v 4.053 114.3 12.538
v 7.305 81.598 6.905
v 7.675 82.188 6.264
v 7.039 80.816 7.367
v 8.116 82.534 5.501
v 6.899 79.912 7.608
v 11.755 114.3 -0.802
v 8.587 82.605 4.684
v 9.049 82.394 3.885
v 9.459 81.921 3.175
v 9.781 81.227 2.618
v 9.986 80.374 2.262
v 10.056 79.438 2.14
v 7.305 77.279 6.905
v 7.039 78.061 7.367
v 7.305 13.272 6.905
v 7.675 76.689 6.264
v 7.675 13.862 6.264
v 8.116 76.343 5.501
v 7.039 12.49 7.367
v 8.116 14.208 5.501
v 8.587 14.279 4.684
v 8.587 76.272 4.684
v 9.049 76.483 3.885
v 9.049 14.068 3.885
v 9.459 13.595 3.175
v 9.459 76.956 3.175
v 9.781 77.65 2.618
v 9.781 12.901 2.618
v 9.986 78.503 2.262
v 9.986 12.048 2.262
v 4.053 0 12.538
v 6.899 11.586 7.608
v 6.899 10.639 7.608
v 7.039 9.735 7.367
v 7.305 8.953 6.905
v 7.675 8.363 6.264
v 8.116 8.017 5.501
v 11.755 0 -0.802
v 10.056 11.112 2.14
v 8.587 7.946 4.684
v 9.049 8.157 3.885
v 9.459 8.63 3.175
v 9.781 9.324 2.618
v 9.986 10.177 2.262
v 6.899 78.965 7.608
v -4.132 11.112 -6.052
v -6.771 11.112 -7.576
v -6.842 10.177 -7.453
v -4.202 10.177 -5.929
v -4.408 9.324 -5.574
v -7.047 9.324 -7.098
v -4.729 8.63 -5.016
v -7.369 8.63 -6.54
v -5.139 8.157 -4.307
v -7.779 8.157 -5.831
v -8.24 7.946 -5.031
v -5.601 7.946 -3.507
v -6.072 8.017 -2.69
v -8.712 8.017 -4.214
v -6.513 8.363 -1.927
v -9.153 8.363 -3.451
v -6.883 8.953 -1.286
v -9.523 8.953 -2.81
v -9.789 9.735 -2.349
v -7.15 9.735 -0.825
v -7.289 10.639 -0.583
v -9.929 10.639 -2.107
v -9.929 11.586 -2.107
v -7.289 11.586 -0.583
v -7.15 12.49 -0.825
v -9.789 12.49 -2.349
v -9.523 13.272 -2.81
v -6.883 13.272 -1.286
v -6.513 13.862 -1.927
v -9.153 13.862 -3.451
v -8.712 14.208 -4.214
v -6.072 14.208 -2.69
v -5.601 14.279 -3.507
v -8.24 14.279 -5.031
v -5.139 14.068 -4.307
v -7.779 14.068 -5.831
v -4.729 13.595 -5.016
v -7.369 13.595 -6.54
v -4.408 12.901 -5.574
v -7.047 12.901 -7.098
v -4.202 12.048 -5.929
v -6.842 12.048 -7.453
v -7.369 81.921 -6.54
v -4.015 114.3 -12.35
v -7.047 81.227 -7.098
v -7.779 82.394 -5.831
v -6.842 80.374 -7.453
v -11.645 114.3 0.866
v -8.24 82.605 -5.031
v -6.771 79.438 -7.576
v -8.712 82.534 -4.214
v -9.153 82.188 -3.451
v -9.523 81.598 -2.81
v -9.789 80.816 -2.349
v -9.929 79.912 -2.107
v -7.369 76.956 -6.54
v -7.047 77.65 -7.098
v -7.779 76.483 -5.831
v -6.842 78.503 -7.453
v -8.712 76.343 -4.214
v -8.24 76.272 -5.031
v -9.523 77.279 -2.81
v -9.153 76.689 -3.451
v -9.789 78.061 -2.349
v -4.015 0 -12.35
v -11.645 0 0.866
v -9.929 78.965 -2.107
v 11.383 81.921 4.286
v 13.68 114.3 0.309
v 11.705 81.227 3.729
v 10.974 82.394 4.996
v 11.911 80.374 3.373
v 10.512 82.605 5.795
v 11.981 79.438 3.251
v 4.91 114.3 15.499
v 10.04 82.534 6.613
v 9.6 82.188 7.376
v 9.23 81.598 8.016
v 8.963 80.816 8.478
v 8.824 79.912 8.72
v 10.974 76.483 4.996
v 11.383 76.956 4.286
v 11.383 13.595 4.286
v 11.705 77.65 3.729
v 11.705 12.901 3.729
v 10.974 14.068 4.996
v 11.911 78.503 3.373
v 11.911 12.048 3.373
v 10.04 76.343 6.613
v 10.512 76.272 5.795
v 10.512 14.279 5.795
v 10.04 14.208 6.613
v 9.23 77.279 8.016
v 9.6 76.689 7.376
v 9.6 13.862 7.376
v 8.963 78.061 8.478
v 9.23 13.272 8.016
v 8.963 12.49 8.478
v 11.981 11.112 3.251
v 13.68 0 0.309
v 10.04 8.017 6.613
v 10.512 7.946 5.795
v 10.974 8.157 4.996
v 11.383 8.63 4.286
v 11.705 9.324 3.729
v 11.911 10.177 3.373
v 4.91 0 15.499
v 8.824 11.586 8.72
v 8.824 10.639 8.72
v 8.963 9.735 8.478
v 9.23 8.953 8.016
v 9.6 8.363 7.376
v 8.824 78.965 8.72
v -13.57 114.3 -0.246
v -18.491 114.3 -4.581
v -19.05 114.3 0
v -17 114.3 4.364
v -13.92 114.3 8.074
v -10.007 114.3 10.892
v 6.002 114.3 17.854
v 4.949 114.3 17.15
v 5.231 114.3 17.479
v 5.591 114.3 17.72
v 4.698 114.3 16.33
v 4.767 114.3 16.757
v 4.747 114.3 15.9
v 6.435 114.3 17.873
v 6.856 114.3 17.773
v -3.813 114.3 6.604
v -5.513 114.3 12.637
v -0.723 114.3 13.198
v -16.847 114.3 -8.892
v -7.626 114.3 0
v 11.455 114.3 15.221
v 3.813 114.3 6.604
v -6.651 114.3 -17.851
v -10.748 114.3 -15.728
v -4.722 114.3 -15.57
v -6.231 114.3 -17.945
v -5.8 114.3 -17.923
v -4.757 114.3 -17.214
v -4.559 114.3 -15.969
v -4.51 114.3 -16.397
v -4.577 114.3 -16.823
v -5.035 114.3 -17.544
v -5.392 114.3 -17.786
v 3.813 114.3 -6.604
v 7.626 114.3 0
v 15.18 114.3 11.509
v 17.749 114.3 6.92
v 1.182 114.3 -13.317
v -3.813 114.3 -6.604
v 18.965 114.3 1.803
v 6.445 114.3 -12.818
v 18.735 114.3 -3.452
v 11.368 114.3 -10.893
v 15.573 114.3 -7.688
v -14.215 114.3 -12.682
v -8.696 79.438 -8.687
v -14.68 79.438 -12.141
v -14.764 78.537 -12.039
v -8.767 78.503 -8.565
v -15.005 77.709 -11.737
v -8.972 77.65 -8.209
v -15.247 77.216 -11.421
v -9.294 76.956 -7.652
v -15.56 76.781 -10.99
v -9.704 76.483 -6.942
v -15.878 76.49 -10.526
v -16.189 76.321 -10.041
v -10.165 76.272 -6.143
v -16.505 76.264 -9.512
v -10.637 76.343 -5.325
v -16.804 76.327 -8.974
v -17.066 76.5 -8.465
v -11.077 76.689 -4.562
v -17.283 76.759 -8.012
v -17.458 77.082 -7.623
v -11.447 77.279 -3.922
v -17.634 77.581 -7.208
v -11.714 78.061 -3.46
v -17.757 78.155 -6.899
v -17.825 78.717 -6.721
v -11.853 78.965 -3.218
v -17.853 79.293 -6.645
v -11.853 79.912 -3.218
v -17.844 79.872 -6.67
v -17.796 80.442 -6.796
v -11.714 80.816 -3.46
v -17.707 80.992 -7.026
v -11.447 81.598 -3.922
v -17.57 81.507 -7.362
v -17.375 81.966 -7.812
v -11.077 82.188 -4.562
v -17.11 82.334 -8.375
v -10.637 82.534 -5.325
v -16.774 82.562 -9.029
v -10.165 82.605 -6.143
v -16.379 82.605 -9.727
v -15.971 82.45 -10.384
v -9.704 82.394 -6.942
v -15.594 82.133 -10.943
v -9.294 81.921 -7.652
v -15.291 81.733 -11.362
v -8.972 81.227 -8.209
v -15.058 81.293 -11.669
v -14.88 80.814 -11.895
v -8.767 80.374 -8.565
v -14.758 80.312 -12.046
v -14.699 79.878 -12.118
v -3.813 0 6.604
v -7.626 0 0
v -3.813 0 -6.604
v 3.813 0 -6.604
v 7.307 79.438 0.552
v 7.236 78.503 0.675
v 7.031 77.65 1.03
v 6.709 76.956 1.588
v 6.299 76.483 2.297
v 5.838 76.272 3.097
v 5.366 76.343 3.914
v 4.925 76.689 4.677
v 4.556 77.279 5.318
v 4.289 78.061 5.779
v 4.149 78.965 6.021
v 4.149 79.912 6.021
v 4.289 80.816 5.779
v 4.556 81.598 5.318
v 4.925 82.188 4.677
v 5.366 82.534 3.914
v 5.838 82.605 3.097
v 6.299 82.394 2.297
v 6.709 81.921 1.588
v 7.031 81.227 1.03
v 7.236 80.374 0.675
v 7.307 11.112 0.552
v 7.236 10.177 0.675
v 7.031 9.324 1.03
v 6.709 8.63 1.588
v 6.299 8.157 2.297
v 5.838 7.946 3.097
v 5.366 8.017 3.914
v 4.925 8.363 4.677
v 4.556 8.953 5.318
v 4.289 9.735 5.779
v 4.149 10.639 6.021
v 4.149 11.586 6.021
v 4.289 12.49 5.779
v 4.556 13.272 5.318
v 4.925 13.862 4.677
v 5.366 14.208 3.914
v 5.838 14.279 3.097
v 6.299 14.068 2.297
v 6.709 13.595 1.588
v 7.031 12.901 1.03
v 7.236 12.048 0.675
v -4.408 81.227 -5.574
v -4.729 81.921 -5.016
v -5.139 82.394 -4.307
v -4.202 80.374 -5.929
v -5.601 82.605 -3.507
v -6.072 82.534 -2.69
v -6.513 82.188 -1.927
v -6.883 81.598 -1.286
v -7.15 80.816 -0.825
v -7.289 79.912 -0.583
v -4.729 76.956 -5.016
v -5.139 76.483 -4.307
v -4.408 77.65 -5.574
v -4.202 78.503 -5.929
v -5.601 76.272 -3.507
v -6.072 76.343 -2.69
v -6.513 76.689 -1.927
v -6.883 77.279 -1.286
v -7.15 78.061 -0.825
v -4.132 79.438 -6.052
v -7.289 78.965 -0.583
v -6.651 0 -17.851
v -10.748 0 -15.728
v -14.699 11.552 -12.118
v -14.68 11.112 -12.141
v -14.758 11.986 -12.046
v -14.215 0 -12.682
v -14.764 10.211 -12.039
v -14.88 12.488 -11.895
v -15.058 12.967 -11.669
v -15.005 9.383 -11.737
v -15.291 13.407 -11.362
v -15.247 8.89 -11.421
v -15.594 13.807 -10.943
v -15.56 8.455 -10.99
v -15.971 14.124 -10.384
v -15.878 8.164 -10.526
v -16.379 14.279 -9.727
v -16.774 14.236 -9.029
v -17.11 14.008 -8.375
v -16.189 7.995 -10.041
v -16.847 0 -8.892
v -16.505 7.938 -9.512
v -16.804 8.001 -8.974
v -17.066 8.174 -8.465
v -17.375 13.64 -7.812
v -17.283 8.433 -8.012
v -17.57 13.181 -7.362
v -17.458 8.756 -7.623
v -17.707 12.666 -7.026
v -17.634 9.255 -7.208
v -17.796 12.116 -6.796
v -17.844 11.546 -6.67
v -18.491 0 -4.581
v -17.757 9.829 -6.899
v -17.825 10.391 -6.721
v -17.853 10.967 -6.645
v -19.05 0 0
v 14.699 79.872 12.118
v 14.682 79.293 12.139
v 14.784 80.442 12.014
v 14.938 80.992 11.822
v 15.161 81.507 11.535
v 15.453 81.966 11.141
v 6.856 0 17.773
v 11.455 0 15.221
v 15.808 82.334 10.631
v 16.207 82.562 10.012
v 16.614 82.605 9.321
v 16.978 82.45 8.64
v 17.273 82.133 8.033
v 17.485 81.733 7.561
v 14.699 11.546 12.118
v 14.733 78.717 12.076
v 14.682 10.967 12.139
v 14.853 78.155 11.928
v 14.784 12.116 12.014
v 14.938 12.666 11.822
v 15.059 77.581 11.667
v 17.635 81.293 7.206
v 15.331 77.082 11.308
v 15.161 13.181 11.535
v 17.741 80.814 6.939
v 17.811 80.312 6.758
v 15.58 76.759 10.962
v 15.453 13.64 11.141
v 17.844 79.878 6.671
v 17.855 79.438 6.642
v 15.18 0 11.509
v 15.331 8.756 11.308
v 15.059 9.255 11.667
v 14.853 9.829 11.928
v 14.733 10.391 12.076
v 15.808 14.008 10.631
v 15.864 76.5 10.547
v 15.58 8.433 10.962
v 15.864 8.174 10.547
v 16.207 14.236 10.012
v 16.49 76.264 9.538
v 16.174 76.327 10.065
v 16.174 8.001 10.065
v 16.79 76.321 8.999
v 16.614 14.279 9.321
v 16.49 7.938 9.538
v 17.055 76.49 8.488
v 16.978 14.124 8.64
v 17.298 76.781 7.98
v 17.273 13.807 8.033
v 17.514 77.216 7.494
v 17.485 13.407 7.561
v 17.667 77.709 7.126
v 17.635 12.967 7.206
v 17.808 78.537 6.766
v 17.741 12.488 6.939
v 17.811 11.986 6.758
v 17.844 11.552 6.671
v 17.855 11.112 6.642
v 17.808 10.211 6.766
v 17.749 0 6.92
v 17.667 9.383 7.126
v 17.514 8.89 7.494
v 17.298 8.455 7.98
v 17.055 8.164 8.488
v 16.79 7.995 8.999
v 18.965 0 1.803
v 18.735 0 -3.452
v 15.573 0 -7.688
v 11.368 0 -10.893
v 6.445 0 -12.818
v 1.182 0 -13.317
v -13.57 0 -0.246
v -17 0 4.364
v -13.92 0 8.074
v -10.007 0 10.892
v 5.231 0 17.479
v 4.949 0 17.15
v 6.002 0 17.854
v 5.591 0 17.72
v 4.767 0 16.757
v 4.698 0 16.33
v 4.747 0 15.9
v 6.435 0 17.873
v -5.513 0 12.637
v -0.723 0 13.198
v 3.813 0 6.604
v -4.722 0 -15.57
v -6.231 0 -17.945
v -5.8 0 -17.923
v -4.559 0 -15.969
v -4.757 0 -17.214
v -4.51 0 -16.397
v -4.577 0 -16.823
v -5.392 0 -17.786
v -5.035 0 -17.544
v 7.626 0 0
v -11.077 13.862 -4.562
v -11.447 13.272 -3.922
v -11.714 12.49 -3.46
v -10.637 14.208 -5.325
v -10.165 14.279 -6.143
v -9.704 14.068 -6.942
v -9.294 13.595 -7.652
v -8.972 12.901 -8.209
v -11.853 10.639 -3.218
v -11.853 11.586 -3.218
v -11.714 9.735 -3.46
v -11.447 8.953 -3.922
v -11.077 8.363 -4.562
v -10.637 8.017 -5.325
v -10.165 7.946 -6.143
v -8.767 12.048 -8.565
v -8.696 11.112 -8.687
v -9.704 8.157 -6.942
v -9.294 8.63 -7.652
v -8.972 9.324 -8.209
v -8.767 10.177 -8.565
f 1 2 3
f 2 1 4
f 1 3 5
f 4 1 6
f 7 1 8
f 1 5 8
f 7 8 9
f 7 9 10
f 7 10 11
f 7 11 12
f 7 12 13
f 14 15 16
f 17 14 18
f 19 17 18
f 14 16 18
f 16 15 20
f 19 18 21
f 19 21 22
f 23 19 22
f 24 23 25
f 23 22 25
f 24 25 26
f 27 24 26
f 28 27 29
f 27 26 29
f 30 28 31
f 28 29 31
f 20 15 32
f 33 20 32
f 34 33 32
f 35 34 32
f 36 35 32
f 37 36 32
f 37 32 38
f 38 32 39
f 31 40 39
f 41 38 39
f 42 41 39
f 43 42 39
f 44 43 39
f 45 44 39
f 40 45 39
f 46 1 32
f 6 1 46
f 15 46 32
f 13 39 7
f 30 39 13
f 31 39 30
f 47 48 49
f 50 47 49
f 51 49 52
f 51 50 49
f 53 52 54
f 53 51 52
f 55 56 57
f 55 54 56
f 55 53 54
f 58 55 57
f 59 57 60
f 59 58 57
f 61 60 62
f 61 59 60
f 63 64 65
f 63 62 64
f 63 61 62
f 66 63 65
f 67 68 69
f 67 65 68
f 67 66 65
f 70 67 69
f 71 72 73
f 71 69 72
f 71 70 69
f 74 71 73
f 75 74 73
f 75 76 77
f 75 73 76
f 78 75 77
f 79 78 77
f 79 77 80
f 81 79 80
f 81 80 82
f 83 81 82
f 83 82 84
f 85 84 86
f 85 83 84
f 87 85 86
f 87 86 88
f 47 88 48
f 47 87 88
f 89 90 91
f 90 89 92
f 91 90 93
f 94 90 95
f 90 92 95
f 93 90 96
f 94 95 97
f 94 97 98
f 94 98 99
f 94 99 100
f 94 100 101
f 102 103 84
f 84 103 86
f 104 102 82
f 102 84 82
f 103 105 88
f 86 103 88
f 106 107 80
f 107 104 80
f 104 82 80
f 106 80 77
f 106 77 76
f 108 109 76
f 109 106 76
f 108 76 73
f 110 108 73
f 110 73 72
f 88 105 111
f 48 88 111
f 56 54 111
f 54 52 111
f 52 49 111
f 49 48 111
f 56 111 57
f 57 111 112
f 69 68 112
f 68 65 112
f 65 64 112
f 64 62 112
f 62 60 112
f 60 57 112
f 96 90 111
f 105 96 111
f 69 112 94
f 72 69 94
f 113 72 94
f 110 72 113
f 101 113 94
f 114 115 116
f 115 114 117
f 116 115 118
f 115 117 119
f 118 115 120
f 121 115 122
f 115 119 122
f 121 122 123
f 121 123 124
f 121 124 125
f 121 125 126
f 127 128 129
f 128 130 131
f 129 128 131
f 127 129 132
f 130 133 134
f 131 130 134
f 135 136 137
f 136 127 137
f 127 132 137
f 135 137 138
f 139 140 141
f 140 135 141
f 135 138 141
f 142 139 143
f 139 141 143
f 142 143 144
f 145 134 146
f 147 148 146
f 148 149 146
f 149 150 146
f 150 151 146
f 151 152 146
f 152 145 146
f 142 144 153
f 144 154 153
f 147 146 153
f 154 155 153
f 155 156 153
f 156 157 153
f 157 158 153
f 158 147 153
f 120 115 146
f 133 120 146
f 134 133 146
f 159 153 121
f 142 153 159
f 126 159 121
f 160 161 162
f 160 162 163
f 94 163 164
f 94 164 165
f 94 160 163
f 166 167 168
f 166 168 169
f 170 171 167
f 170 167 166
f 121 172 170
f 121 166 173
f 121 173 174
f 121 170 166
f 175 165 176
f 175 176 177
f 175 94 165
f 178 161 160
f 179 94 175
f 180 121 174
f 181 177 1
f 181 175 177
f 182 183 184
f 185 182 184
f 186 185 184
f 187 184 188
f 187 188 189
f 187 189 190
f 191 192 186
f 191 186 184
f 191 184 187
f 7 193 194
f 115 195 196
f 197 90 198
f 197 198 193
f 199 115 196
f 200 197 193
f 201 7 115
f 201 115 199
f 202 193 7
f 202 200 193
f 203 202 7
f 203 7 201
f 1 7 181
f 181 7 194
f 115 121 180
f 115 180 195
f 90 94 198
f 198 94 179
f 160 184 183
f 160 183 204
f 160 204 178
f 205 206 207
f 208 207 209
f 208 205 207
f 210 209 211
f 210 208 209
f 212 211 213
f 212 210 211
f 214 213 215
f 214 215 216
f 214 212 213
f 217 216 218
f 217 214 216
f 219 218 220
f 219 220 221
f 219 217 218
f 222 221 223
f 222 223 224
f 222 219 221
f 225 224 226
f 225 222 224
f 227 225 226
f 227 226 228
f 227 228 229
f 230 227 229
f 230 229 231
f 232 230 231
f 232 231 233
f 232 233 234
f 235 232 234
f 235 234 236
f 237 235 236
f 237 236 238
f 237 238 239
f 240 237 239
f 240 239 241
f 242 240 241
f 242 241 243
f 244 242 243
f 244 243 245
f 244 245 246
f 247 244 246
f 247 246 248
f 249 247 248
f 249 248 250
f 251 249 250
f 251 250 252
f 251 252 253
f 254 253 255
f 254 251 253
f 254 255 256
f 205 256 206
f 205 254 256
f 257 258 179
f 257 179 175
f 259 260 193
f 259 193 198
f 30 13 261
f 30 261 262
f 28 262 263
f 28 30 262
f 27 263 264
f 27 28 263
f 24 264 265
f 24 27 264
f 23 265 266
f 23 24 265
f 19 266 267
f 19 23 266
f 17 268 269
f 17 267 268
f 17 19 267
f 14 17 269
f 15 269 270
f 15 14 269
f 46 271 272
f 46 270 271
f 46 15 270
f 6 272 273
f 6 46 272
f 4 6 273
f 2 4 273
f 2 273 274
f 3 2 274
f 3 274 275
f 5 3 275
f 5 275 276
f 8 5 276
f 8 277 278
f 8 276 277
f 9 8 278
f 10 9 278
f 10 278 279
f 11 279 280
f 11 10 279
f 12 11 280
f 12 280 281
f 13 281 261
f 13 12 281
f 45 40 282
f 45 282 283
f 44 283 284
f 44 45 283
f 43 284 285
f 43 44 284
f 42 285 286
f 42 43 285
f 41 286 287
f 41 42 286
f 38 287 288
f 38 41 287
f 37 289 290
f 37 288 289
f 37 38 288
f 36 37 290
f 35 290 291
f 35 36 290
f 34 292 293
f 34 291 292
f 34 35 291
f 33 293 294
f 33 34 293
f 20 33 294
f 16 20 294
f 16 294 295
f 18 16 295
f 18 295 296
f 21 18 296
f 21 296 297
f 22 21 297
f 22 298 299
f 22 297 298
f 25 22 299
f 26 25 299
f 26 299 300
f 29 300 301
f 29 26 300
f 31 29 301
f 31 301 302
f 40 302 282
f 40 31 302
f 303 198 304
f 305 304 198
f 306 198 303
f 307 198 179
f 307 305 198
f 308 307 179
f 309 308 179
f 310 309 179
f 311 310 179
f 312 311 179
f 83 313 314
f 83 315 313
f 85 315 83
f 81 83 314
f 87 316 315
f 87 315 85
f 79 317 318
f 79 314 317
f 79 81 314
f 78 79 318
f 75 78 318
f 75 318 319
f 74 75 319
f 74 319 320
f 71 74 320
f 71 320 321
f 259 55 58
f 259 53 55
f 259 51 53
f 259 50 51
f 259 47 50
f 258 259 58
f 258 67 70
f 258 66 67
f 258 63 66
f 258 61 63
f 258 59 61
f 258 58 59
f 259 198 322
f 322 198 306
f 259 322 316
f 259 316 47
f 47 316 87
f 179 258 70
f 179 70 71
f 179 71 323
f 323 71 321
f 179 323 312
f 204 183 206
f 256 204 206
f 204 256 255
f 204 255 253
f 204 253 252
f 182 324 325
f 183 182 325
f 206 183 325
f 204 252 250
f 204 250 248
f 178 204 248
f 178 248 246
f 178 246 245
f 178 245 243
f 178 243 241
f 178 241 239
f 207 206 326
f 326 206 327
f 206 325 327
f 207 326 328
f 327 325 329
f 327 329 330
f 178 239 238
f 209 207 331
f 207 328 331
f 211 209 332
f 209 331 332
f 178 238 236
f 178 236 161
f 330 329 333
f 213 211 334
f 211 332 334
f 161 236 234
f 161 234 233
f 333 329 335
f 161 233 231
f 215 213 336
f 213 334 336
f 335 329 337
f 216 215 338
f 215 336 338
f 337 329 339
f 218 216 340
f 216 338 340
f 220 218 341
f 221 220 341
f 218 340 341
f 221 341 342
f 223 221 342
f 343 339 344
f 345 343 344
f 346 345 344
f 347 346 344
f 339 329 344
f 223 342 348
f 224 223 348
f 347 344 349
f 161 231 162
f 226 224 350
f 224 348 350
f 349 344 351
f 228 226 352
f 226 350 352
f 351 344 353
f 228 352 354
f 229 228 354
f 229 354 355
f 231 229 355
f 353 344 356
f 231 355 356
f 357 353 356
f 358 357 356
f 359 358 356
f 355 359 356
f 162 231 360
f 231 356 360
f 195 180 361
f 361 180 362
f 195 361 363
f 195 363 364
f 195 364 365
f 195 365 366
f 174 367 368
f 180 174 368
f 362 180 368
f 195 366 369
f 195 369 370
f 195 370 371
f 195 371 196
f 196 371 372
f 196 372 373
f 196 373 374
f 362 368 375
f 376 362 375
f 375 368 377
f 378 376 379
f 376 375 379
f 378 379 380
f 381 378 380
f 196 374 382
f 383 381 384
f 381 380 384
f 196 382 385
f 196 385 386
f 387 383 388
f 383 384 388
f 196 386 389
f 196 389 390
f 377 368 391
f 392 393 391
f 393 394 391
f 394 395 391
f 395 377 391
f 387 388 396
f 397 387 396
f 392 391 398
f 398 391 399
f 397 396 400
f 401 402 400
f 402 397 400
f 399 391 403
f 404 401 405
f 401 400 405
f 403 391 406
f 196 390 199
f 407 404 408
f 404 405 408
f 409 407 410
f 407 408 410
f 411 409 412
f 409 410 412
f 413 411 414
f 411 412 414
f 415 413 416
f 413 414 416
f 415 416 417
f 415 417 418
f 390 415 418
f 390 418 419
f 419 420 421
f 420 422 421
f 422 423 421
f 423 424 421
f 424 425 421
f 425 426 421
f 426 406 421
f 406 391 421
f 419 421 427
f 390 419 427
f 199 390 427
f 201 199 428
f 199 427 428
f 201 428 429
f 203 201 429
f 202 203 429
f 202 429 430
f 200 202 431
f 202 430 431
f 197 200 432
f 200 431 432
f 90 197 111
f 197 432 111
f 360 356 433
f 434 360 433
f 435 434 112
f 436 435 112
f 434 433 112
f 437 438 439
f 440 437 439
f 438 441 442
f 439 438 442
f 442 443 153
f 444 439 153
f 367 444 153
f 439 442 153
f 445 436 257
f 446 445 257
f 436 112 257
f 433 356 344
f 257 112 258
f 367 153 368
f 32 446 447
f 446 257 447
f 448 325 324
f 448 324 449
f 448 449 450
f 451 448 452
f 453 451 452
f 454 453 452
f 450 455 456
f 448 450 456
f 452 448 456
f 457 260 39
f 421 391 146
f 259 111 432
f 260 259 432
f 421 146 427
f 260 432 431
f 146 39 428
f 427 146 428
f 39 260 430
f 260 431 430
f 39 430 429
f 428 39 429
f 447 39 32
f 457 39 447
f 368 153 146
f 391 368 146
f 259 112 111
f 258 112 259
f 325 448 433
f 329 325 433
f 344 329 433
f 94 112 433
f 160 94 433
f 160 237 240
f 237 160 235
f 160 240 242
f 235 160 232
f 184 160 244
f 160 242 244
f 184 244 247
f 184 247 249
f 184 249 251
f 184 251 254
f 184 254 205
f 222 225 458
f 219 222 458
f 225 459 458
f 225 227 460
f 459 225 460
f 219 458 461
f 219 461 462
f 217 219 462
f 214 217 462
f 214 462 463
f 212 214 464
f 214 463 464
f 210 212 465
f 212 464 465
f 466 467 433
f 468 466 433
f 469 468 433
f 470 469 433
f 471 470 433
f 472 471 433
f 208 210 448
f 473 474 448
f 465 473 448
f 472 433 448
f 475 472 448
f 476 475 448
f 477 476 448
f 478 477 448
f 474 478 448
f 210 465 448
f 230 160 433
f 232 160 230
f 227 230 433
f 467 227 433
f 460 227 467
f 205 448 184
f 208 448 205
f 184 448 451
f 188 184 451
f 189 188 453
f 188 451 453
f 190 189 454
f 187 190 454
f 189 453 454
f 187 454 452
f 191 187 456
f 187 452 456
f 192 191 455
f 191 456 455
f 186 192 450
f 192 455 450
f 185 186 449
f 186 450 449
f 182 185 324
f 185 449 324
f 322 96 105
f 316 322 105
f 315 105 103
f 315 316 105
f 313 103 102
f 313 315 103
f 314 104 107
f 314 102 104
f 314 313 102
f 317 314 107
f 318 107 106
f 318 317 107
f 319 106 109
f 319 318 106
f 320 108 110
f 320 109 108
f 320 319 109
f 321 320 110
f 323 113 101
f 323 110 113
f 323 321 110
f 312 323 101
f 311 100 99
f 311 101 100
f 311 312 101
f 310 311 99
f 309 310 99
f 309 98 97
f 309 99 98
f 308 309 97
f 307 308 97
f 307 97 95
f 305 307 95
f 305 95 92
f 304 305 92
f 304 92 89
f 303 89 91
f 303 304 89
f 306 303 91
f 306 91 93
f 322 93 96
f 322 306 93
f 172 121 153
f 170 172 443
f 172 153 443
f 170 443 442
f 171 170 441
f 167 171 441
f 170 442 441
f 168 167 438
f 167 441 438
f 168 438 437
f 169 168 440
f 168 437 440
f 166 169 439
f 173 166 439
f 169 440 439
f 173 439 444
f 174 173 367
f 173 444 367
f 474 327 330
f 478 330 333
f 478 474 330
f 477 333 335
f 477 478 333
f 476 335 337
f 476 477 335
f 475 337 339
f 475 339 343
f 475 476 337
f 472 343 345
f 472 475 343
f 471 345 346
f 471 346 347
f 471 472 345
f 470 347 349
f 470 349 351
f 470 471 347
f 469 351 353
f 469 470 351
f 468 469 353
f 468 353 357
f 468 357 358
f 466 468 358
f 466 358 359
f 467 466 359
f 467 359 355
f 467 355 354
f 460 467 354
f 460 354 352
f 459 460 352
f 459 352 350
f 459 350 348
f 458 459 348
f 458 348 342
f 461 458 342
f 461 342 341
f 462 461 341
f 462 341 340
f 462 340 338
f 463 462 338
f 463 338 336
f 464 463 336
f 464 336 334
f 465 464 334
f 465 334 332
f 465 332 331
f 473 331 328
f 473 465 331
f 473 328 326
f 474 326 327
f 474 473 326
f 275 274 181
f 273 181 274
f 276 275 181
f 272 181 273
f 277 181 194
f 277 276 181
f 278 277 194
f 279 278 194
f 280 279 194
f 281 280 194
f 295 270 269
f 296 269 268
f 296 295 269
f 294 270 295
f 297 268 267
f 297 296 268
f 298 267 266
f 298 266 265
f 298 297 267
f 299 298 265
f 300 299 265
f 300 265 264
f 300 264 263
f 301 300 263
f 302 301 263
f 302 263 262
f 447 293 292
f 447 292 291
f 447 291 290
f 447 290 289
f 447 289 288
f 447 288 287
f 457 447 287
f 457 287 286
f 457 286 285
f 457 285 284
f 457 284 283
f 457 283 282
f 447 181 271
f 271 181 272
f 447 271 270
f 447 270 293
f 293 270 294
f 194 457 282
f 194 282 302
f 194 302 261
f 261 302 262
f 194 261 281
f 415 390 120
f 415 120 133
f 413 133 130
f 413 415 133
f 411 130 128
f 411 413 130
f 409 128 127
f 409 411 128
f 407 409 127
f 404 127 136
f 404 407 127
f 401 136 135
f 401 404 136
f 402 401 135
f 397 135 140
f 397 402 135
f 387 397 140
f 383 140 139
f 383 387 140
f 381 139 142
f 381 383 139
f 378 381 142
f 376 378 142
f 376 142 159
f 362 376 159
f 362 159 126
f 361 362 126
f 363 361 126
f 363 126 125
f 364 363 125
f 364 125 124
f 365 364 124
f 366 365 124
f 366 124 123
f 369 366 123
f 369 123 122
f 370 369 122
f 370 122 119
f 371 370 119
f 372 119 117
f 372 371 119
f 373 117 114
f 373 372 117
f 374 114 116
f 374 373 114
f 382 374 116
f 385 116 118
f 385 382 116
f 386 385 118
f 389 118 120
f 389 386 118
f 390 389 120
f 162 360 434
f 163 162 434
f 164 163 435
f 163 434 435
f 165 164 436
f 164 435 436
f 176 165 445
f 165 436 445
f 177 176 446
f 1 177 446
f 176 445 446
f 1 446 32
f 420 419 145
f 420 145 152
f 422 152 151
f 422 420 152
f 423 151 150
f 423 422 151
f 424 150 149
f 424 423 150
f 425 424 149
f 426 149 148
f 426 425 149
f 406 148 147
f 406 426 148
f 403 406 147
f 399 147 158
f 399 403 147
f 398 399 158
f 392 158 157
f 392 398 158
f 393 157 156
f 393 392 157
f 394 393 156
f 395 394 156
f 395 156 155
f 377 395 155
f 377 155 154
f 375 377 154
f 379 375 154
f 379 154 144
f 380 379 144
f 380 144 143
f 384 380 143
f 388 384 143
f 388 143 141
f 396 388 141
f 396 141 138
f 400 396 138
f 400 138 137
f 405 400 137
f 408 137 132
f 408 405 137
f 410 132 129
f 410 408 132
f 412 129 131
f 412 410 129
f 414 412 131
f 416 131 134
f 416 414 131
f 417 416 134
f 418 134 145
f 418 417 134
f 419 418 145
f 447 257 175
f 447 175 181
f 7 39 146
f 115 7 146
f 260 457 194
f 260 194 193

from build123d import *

# Parameters (mm, degrees)
BOSS_EXTRUDE1_DEPTH     = 114.3
CUT_EXTRUDE1_DEPTH      = 119.868393362
CUT_EXTRUDE1_DEPTH_BACK = 119.868393362
SKETCH2_R               = 3.175


with BuildPart() as part:
    # Sketch1 → Boss-Extrude1 (new body)
    with BuildSketch(Plane(origin=(0, 0, 0), x_dir=(1, 0, 0), z_dir=(0, 1, 0))):
        with BuildLine():
            Line((4.052973773, -12.538043503), (11.754987424, 0.80223546))
            Line((11.754987424, 0.80223546), (13.679728884, -0.30901454))
            Line((13.679728884, -0.30901454), (4.910037862, -15.498564956))
            ThreePointArc((4.910037862, -15.498564956), (5.078558502, -17.32430787), (6.856203481, -17.773434497))
            ThreePointArc((6.856203481, -17.773434497), (16.623747328, -9.303414683), (18.73470204, 3.451585069))
            ThreePointArc((18.73470204, 3.451585069), (8.97391608, 12.027162481), (-4.01489639, 12.349995465))
            Line((-4.01489639, 12.349995465), (-11.645002197, -0.86573546))
            Line((-11.645002197, -0.86573546), (-13.569743657, 0.24551454))
            Line((-13.569743657, 0.24551454), (-4.722290977, 15.569752099))
            ThreePointArc((-4.722290977, 15.569752099), (-4.884898453, 17.388542767), (-6.651388697, 17.851093199))
            ThreePointArc((-6.651388697, 17.851093199), (-15.646268799, 10.867233901), (-19.05, 0))
            ThreePointArc((-19.05, 0), (-10.00744853, -10.892061153), (4.052973773, -12.538043503))
        make_face()
        Polygon((3.812821178, -6.604), (7.625642355, 0), (3.812821178, 6.604), (-3.812821178, 6.604), (-7.625642355, 0), (-3.812821178, -6.604), align=None, mode=Mode.SUBTRACT)
    extrude(amount=BOSS_EXTRUDE1_DEPTH)

    # Sketch2 → Cut-Extrude1 (cut, two sides: drawn at the far end of the back side and taken through both)
    with BuildSketch(Plane(origin=(5.719231767, 0, 3.302), x_dir=(-0.5000000000000001, 0, 0.8660254037844386), z_dir=(-0.8660254037844386, 0, -0.5000000000000001)).offset(-CUT_EXTRUDE1_DEPTH_BACK)):
        with Locations(Location((0, 11.1125, 0), (0, 0, 180))):
            Circle(SKETCH2_R)
        with Locations(Location((0, 79.4385, 0), (0, 0, 180))):
            Circle(SKETCH2_R)
    extrude(amount=CUT_EXTRUDE1_DEPTH + CUT_EXTRUDE1_DEPTH_BACK, mode=Mode.SUBTRACT)


solid = part.part
